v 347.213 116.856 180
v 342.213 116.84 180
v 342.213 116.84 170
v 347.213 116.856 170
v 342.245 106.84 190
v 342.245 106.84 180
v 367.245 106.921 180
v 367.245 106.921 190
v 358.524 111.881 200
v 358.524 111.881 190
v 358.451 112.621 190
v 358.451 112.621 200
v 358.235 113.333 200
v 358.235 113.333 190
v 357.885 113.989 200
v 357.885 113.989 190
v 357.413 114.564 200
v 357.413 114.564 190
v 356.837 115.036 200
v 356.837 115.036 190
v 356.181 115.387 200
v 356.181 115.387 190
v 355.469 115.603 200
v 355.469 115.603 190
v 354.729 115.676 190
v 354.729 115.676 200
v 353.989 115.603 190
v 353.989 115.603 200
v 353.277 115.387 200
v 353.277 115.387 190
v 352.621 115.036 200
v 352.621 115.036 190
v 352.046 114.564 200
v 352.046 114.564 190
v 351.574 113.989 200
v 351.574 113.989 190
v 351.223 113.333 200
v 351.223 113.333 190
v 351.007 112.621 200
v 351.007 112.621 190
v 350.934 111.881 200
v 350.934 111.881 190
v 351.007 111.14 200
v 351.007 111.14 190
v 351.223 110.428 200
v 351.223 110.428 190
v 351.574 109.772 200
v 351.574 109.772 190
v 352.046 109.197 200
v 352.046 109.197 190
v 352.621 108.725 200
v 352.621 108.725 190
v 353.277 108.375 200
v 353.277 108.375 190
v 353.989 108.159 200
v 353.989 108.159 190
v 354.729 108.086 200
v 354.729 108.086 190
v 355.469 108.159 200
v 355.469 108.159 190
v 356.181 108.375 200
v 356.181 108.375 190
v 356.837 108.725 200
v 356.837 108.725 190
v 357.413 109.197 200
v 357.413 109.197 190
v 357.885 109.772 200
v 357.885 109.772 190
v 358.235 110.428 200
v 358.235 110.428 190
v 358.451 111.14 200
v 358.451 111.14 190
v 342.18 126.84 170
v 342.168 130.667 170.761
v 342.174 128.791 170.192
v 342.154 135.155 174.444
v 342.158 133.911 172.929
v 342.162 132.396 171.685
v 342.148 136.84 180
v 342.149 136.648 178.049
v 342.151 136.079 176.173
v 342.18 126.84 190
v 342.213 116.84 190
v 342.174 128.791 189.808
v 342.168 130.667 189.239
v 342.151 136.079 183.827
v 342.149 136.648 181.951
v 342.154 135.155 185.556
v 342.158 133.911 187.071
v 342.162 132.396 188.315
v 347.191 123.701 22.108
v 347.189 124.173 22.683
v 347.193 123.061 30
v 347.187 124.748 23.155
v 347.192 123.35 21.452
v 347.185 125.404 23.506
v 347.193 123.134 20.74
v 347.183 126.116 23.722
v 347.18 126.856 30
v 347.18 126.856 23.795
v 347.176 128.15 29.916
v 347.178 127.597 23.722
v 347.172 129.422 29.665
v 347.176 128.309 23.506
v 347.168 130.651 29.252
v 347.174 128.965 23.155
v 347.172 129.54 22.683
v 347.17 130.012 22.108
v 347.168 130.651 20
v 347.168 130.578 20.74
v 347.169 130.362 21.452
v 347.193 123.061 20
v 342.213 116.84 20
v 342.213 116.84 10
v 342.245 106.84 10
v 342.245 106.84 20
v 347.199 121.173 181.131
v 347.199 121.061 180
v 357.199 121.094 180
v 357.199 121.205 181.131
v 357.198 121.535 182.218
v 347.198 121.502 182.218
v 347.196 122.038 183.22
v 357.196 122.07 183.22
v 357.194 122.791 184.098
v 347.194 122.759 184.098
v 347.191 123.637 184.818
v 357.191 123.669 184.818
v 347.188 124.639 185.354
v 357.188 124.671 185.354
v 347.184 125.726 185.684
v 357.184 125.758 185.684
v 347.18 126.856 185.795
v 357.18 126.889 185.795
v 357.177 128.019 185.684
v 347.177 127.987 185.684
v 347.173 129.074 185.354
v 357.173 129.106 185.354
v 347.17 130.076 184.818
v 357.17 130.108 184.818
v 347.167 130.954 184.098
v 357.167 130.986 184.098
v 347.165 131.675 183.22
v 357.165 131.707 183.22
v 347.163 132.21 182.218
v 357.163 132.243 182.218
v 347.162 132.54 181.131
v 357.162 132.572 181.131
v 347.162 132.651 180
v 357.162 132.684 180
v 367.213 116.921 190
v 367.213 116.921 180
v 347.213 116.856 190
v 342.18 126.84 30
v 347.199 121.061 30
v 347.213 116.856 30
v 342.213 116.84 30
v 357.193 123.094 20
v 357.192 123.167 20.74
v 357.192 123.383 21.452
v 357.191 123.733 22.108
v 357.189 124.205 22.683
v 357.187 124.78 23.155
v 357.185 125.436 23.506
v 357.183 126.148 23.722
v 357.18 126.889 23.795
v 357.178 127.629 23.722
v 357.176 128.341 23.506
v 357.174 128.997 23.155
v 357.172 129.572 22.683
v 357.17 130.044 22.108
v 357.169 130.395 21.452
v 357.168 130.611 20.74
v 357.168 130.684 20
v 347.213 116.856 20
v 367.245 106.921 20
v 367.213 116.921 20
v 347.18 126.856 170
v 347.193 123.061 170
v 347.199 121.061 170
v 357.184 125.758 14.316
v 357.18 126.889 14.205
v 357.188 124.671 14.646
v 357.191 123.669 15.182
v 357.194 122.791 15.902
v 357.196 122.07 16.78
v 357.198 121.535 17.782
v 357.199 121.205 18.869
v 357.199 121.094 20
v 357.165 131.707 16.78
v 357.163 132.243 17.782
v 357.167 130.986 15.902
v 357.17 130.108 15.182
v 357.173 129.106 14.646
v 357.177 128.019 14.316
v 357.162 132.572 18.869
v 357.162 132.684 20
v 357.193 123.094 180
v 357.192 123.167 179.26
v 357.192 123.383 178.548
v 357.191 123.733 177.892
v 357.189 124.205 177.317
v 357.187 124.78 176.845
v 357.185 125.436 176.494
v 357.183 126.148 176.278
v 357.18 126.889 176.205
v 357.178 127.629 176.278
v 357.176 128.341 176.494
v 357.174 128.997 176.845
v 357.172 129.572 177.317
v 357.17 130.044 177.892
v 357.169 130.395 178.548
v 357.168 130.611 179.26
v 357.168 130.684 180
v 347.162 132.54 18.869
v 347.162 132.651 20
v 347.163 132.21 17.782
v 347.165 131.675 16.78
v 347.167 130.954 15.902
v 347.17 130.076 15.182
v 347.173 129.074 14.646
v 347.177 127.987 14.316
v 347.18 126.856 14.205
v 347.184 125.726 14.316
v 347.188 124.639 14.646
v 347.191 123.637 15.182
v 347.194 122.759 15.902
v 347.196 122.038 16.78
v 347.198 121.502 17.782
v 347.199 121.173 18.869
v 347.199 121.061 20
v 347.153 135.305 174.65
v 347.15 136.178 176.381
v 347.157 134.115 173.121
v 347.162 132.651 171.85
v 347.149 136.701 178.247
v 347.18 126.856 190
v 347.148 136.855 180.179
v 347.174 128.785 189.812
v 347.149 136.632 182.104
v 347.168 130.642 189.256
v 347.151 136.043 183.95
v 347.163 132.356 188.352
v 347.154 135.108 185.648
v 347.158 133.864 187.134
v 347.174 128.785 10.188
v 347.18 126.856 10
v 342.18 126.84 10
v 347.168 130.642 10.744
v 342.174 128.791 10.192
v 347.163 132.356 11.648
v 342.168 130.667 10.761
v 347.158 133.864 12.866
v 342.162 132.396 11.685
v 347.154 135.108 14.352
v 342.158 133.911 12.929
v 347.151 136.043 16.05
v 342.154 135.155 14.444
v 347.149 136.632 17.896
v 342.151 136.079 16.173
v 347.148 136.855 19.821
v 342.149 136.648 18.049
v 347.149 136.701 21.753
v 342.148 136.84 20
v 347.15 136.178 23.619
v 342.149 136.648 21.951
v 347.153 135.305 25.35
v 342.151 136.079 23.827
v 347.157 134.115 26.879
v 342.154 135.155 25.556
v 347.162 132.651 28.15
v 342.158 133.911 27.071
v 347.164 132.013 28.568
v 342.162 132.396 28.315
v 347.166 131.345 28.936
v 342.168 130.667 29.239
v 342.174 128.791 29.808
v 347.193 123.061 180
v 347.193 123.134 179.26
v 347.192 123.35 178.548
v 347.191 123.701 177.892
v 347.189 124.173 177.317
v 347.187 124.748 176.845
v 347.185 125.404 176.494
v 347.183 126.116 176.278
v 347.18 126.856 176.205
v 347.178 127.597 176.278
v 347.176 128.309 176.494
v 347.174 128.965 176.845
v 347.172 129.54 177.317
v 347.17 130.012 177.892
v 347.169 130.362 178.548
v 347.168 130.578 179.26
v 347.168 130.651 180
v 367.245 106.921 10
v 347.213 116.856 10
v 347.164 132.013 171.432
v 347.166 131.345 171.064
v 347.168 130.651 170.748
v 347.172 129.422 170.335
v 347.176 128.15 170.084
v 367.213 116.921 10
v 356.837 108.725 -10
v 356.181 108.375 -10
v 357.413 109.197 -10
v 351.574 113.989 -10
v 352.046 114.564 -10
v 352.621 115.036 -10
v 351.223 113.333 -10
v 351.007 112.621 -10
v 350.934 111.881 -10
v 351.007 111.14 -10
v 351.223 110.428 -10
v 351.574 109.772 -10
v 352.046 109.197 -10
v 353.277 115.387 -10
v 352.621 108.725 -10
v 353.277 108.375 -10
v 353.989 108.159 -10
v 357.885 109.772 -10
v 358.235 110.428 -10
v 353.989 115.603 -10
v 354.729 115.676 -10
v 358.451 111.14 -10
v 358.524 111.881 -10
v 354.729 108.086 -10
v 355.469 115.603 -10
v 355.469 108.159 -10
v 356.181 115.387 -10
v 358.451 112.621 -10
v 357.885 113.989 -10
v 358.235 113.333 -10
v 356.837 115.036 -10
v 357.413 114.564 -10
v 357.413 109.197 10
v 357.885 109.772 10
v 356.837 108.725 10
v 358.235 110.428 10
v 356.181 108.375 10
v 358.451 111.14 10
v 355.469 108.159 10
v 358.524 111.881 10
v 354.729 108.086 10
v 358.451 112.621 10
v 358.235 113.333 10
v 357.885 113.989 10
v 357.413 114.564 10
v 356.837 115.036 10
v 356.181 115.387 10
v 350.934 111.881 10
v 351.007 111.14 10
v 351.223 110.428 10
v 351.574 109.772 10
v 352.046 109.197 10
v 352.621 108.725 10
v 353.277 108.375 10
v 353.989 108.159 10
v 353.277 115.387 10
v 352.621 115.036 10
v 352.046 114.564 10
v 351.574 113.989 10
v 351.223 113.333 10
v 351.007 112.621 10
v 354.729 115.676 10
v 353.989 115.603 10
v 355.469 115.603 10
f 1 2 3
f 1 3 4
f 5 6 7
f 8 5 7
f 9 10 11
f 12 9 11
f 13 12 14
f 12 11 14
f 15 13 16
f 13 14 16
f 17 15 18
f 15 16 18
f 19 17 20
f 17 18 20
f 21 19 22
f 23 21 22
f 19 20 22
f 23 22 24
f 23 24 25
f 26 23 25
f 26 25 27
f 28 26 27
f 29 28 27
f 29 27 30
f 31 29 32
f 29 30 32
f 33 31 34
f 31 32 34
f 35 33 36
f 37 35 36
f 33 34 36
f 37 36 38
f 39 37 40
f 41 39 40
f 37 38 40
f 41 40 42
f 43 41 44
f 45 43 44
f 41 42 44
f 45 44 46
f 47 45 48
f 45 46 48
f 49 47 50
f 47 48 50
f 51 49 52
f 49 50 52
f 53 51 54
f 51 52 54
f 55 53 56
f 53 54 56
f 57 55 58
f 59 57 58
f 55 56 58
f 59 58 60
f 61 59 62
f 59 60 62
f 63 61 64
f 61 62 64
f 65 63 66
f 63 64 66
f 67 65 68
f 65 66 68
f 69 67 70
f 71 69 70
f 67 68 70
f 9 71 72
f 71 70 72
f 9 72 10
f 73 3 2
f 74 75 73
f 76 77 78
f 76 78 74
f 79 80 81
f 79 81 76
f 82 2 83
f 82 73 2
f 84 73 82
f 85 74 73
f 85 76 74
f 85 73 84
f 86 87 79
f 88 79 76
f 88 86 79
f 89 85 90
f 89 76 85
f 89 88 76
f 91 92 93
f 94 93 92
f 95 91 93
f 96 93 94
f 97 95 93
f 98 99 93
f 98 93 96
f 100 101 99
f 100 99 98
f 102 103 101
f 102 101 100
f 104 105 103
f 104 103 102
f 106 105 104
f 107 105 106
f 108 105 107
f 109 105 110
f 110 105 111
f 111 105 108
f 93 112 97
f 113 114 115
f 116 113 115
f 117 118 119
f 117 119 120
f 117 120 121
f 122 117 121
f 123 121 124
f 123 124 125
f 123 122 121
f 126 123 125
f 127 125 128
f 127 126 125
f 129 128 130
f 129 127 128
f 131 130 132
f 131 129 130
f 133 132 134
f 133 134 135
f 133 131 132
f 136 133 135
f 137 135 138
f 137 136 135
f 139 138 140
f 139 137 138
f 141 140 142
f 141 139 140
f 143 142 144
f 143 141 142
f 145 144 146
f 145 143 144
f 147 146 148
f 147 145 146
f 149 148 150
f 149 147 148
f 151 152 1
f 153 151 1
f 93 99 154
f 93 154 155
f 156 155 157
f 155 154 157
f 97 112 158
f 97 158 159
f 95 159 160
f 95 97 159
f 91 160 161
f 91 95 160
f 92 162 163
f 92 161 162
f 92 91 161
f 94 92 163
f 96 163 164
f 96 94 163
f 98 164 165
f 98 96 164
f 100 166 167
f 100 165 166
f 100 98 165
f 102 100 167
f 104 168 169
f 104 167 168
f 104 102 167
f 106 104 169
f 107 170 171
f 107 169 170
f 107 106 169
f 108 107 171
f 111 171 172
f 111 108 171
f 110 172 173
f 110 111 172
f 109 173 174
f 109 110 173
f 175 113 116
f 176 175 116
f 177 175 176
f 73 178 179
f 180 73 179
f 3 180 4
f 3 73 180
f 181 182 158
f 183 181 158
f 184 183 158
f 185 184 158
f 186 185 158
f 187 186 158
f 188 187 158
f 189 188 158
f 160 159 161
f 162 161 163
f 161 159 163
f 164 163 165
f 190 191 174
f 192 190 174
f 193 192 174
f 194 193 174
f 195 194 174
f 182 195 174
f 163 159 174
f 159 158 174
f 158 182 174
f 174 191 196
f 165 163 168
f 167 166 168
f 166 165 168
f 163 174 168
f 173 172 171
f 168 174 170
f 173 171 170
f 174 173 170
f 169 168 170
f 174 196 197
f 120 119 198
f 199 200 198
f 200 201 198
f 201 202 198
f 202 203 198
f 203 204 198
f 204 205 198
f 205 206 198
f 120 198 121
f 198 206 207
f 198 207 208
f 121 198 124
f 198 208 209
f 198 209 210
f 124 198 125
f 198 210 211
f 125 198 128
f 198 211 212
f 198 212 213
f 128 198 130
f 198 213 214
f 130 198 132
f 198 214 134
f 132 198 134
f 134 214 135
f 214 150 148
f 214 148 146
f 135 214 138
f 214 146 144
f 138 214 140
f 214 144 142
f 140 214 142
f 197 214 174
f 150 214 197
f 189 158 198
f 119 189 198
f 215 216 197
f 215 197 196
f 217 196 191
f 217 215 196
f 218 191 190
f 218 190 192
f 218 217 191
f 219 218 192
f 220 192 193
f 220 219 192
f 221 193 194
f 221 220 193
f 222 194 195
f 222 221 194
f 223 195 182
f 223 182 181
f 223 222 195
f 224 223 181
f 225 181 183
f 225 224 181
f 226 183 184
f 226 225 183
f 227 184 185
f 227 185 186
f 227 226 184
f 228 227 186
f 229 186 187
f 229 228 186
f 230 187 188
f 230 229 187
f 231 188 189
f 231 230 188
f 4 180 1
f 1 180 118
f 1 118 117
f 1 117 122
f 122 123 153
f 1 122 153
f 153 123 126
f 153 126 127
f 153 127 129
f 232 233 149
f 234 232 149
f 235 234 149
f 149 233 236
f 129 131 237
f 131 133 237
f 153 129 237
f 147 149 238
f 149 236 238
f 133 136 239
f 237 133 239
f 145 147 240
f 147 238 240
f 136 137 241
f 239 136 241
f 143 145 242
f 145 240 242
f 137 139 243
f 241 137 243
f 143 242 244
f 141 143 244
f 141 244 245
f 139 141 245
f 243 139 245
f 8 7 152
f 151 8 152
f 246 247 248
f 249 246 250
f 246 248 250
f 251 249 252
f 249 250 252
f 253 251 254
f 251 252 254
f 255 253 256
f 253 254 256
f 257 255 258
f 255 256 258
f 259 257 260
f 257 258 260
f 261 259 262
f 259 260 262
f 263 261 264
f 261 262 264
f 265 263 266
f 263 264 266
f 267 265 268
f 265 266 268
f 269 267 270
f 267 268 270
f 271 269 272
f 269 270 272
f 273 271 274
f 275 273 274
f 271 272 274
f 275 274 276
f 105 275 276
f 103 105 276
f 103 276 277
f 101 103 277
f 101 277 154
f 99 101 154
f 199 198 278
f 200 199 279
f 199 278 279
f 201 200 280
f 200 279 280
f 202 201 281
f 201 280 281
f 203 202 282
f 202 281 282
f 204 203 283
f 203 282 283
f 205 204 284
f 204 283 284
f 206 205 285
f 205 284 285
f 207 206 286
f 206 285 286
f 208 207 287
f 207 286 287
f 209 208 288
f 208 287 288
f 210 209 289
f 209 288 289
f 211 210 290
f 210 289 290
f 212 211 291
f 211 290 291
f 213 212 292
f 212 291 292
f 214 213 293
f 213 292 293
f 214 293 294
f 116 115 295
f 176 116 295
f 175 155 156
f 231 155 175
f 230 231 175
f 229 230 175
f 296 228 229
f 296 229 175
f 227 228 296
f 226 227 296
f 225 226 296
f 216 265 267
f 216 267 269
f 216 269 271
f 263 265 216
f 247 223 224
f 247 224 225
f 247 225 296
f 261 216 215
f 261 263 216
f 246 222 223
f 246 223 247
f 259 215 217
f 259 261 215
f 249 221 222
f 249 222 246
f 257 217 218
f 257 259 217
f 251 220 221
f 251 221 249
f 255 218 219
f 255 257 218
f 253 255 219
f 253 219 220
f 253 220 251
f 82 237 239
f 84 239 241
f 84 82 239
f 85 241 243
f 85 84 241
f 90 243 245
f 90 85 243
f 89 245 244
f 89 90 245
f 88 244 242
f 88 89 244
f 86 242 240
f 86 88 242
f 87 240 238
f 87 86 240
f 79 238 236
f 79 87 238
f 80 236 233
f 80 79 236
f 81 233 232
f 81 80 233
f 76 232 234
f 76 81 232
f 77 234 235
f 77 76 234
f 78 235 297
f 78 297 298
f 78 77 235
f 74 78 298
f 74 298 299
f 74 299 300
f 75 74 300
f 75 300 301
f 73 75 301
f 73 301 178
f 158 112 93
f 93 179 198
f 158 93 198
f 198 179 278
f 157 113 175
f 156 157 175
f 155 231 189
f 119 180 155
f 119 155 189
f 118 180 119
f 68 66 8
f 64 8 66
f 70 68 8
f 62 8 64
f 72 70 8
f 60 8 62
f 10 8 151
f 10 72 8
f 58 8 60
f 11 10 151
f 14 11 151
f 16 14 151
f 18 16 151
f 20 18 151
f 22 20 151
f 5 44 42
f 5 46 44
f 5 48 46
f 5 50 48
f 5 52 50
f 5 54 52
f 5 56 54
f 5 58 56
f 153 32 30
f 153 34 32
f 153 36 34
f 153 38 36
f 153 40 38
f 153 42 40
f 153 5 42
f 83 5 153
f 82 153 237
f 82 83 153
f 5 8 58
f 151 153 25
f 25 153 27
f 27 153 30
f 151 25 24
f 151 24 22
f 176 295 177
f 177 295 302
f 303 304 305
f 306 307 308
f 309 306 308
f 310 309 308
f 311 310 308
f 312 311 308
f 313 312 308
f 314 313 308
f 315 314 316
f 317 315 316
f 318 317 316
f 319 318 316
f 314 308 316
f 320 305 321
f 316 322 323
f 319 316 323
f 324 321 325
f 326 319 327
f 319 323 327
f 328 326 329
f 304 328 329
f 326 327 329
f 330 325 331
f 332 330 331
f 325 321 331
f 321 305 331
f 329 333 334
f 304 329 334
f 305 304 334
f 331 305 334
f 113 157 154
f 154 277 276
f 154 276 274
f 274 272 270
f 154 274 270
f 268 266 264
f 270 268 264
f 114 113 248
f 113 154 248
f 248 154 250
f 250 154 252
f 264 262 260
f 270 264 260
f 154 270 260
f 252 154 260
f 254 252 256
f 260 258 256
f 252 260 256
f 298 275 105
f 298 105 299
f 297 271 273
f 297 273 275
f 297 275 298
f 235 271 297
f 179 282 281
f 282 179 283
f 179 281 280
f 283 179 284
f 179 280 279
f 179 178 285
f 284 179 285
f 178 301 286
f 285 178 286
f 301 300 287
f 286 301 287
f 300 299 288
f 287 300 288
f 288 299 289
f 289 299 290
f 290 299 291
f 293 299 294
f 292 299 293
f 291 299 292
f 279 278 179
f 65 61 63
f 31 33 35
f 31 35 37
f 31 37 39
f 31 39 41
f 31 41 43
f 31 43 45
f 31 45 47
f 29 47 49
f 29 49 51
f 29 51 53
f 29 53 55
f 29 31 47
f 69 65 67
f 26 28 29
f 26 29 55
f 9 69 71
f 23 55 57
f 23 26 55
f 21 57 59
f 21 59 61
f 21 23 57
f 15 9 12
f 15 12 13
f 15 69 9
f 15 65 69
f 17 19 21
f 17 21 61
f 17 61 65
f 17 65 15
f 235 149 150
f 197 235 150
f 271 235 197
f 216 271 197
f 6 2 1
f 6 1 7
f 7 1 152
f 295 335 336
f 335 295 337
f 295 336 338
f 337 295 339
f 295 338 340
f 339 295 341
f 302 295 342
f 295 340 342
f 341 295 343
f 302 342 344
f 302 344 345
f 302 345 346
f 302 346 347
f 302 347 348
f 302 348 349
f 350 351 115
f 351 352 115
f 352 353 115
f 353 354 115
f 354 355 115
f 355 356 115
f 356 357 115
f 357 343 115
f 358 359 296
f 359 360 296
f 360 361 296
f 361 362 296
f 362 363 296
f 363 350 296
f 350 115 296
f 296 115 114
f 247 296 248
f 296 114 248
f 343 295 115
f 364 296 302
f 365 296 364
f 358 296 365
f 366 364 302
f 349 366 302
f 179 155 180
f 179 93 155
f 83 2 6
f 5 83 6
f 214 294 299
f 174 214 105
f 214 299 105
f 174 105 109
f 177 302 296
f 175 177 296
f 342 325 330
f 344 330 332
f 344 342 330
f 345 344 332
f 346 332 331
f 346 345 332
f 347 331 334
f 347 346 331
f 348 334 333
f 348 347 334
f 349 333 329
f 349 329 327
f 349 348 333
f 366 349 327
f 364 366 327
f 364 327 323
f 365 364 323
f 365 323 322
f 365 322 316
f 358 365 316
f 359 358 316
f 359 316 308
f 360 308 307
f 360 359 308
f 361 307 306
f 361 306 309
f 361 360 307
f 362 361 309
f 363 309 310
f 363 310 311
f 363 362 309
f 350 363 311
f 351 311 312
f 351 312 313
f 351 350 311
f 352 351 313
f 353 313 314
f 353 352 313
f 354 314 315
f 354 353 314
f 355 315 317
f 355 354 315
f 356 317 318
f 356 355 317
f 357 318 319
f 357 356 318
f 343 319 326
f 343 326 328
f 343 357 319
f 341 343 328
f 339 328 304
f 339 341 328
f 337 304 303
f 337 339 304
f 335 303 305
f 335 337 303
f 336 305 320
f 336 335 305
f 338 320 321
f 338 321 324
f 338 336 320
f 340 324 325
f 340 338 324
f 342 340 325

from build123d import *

# Parameters (mm, degrees)
SKETCH1_R           = 3.795
BOSS_EXTRUDE1_DEPTH = 10
BOSS_EXTRUDE2_DEPTH = 180
BOSS_EXTRUDE3_START = 10
SKETCH4_R           = 3.795
BOSS_EXTRUDE3_DEPTH = 10
SKETCH7_R           = 3.795
BOSS_EXTRUDE6_DEPTH = 5
SKETCH7_2_R         = 3.795
BOSS_EXTRUDE7_DEPTH = 15
BOSS_EXTRUDE8_DEPTH = 10
SKETCH9_W           = 479.703862309
SKETCH9_H           = 160
CUT_EXTRUDE1_DEPTH  = 420.035827381


with BuildPart() as part:
    # Sketch1 → Boss-Extrude1 (new, symmetric)
    with BuildSketch(Plane.XY):
        with Locations((354.729090947, 111.880692363)):
            Circle(SKETCH1_R)
    extrude(amount=BOSS_EXTRUDE1_DEPTH, both=True)

    # Sketch3 → Boss-Extrude2 (add)
    with BuildSketch(Plane.XY.offset(10)):
        Polygon((367.212888015, 116.921199692), (342.212888015, 116.840185034), (342.245293879, 106.840185034), (367.245293879, 106.921199692), align=None)
    extrude(amount=BOSS_EXTRUDE2_DEPTH)

    # Sketch4 → Boss-Extrude3 (add)
    with BuildSketch(Plane.XY.offset(190).offset(BOSS_EXTRUDE3_START)):
        with Locations((354.729090947, 111.880692363)):
            Circle(SKETCH4_R)
    extrude(amount=-BOSS_EXTRUDE3_DEPTH)

    # Sketch7 → Boss-Extrude6 (add)
    with BuildSketch(Plane(origin=(342.587921066, 1.110185725, 0), x_dir=(0, 0, 1), z_dir=(-0.9999947493415573, -0.0032405692888977803, 0))):
        with BuildLine():
            Line((10, 115.730606971), (10, 125.730606971))
            ThreePointArc((10, 125.730606971), (20, 135.730606971), (30, 125.730606971))
            Line((30, 125.730606971), (30, 115.730606971))
            Line((30, 115.730606971), (10, 115.730606971))
        make_face()
        with Locations((20, 125.730606971)):
            Circle(SKETCH7_R, mode=Mode.SUBTRACT)
    boss_extrude6 = extrude(amount=-BOSS_EXTRUDE6_DEPTH)

    # Sketch7<2> → Boss-Extrude7 (add)
    with BuildSketch(Plane(origin=(342.587921066, 1.110185725, 0), x_dir=(0, 0, 1), z_dir=(-0.9999947493415573, -0.0032405692888977803, 0))):
        with Locations((20, 125.730606971)):
            Circle(SKETCH7_2_R)
    boss_extrude7 = extrude(amount=-BOSS_EXTRUDE7_DEPTH)

    # Mirror2: Boss-Extrude6, Boss-Extrude7 across plane
    add(boss_extrude6.mirror(Plane.XY.offset(100)))
    add(boss_extrude7.mirror(Plane.XY.offset(100)))

    # Sketch8 → Boss-Extrude8 (add)
    with BuildSketch(Plane(origin=(347.587894813, 1.126388571, 0), x_dir=(0, 0, -1), z_dir=(0.9999947493415573, 0.003240569288897781, 0))):
        with BuildLine():
            Line((-180, 131.525606971), (-20, 131.525606971))
            ThreePointArc((-20, 131.525606971), (-14.205, 125.730606971), (-20, 119.935606971))
            Line((-20, 119.935606971), (-180, 119.935606971))
            ThreePointArc((-180, 119.935606971), (-185.795, 125.730606971), (-180, 131.525606971))
        make_face()
        with BuildLine():
            Line((-180, 129.525606971), (-20, 129.525606971))
            ThreePointArc((-20, 129.525606971), (-16.205, 125.730606971), (-20, 121.935606971))
            Line((-20, 121.935606971), (-180, 121.935606971))
            ThreePointArc((-180, 121.935606971), (-183.795, 125.730606971), (-180, 129.525606971))
        make_face(mode=Mode.SUBTRACT)
    extrude(amount=BOSS_EXTRUDE8_DEPTH)

    # Sketch9 → Cut-Extrude1 (cut, through all)
    with BuildSketch(Plane(origin=(-0.375033051, 115.729999309, 0), x_dir=(0.9999947493415573, 0.003240569288896666, 0), z_dir=(-0.003240569288896666, 0.9999947493415573, 0))):
        with Locations((127.73792, -100)):
            Rectangle(SKETCH9_W, SKETCH9_H)
    extrude(amount=-CUT_EXTRUDE1_DEPTH, mode=Mode.SUBTRACT)


solid = part.part
